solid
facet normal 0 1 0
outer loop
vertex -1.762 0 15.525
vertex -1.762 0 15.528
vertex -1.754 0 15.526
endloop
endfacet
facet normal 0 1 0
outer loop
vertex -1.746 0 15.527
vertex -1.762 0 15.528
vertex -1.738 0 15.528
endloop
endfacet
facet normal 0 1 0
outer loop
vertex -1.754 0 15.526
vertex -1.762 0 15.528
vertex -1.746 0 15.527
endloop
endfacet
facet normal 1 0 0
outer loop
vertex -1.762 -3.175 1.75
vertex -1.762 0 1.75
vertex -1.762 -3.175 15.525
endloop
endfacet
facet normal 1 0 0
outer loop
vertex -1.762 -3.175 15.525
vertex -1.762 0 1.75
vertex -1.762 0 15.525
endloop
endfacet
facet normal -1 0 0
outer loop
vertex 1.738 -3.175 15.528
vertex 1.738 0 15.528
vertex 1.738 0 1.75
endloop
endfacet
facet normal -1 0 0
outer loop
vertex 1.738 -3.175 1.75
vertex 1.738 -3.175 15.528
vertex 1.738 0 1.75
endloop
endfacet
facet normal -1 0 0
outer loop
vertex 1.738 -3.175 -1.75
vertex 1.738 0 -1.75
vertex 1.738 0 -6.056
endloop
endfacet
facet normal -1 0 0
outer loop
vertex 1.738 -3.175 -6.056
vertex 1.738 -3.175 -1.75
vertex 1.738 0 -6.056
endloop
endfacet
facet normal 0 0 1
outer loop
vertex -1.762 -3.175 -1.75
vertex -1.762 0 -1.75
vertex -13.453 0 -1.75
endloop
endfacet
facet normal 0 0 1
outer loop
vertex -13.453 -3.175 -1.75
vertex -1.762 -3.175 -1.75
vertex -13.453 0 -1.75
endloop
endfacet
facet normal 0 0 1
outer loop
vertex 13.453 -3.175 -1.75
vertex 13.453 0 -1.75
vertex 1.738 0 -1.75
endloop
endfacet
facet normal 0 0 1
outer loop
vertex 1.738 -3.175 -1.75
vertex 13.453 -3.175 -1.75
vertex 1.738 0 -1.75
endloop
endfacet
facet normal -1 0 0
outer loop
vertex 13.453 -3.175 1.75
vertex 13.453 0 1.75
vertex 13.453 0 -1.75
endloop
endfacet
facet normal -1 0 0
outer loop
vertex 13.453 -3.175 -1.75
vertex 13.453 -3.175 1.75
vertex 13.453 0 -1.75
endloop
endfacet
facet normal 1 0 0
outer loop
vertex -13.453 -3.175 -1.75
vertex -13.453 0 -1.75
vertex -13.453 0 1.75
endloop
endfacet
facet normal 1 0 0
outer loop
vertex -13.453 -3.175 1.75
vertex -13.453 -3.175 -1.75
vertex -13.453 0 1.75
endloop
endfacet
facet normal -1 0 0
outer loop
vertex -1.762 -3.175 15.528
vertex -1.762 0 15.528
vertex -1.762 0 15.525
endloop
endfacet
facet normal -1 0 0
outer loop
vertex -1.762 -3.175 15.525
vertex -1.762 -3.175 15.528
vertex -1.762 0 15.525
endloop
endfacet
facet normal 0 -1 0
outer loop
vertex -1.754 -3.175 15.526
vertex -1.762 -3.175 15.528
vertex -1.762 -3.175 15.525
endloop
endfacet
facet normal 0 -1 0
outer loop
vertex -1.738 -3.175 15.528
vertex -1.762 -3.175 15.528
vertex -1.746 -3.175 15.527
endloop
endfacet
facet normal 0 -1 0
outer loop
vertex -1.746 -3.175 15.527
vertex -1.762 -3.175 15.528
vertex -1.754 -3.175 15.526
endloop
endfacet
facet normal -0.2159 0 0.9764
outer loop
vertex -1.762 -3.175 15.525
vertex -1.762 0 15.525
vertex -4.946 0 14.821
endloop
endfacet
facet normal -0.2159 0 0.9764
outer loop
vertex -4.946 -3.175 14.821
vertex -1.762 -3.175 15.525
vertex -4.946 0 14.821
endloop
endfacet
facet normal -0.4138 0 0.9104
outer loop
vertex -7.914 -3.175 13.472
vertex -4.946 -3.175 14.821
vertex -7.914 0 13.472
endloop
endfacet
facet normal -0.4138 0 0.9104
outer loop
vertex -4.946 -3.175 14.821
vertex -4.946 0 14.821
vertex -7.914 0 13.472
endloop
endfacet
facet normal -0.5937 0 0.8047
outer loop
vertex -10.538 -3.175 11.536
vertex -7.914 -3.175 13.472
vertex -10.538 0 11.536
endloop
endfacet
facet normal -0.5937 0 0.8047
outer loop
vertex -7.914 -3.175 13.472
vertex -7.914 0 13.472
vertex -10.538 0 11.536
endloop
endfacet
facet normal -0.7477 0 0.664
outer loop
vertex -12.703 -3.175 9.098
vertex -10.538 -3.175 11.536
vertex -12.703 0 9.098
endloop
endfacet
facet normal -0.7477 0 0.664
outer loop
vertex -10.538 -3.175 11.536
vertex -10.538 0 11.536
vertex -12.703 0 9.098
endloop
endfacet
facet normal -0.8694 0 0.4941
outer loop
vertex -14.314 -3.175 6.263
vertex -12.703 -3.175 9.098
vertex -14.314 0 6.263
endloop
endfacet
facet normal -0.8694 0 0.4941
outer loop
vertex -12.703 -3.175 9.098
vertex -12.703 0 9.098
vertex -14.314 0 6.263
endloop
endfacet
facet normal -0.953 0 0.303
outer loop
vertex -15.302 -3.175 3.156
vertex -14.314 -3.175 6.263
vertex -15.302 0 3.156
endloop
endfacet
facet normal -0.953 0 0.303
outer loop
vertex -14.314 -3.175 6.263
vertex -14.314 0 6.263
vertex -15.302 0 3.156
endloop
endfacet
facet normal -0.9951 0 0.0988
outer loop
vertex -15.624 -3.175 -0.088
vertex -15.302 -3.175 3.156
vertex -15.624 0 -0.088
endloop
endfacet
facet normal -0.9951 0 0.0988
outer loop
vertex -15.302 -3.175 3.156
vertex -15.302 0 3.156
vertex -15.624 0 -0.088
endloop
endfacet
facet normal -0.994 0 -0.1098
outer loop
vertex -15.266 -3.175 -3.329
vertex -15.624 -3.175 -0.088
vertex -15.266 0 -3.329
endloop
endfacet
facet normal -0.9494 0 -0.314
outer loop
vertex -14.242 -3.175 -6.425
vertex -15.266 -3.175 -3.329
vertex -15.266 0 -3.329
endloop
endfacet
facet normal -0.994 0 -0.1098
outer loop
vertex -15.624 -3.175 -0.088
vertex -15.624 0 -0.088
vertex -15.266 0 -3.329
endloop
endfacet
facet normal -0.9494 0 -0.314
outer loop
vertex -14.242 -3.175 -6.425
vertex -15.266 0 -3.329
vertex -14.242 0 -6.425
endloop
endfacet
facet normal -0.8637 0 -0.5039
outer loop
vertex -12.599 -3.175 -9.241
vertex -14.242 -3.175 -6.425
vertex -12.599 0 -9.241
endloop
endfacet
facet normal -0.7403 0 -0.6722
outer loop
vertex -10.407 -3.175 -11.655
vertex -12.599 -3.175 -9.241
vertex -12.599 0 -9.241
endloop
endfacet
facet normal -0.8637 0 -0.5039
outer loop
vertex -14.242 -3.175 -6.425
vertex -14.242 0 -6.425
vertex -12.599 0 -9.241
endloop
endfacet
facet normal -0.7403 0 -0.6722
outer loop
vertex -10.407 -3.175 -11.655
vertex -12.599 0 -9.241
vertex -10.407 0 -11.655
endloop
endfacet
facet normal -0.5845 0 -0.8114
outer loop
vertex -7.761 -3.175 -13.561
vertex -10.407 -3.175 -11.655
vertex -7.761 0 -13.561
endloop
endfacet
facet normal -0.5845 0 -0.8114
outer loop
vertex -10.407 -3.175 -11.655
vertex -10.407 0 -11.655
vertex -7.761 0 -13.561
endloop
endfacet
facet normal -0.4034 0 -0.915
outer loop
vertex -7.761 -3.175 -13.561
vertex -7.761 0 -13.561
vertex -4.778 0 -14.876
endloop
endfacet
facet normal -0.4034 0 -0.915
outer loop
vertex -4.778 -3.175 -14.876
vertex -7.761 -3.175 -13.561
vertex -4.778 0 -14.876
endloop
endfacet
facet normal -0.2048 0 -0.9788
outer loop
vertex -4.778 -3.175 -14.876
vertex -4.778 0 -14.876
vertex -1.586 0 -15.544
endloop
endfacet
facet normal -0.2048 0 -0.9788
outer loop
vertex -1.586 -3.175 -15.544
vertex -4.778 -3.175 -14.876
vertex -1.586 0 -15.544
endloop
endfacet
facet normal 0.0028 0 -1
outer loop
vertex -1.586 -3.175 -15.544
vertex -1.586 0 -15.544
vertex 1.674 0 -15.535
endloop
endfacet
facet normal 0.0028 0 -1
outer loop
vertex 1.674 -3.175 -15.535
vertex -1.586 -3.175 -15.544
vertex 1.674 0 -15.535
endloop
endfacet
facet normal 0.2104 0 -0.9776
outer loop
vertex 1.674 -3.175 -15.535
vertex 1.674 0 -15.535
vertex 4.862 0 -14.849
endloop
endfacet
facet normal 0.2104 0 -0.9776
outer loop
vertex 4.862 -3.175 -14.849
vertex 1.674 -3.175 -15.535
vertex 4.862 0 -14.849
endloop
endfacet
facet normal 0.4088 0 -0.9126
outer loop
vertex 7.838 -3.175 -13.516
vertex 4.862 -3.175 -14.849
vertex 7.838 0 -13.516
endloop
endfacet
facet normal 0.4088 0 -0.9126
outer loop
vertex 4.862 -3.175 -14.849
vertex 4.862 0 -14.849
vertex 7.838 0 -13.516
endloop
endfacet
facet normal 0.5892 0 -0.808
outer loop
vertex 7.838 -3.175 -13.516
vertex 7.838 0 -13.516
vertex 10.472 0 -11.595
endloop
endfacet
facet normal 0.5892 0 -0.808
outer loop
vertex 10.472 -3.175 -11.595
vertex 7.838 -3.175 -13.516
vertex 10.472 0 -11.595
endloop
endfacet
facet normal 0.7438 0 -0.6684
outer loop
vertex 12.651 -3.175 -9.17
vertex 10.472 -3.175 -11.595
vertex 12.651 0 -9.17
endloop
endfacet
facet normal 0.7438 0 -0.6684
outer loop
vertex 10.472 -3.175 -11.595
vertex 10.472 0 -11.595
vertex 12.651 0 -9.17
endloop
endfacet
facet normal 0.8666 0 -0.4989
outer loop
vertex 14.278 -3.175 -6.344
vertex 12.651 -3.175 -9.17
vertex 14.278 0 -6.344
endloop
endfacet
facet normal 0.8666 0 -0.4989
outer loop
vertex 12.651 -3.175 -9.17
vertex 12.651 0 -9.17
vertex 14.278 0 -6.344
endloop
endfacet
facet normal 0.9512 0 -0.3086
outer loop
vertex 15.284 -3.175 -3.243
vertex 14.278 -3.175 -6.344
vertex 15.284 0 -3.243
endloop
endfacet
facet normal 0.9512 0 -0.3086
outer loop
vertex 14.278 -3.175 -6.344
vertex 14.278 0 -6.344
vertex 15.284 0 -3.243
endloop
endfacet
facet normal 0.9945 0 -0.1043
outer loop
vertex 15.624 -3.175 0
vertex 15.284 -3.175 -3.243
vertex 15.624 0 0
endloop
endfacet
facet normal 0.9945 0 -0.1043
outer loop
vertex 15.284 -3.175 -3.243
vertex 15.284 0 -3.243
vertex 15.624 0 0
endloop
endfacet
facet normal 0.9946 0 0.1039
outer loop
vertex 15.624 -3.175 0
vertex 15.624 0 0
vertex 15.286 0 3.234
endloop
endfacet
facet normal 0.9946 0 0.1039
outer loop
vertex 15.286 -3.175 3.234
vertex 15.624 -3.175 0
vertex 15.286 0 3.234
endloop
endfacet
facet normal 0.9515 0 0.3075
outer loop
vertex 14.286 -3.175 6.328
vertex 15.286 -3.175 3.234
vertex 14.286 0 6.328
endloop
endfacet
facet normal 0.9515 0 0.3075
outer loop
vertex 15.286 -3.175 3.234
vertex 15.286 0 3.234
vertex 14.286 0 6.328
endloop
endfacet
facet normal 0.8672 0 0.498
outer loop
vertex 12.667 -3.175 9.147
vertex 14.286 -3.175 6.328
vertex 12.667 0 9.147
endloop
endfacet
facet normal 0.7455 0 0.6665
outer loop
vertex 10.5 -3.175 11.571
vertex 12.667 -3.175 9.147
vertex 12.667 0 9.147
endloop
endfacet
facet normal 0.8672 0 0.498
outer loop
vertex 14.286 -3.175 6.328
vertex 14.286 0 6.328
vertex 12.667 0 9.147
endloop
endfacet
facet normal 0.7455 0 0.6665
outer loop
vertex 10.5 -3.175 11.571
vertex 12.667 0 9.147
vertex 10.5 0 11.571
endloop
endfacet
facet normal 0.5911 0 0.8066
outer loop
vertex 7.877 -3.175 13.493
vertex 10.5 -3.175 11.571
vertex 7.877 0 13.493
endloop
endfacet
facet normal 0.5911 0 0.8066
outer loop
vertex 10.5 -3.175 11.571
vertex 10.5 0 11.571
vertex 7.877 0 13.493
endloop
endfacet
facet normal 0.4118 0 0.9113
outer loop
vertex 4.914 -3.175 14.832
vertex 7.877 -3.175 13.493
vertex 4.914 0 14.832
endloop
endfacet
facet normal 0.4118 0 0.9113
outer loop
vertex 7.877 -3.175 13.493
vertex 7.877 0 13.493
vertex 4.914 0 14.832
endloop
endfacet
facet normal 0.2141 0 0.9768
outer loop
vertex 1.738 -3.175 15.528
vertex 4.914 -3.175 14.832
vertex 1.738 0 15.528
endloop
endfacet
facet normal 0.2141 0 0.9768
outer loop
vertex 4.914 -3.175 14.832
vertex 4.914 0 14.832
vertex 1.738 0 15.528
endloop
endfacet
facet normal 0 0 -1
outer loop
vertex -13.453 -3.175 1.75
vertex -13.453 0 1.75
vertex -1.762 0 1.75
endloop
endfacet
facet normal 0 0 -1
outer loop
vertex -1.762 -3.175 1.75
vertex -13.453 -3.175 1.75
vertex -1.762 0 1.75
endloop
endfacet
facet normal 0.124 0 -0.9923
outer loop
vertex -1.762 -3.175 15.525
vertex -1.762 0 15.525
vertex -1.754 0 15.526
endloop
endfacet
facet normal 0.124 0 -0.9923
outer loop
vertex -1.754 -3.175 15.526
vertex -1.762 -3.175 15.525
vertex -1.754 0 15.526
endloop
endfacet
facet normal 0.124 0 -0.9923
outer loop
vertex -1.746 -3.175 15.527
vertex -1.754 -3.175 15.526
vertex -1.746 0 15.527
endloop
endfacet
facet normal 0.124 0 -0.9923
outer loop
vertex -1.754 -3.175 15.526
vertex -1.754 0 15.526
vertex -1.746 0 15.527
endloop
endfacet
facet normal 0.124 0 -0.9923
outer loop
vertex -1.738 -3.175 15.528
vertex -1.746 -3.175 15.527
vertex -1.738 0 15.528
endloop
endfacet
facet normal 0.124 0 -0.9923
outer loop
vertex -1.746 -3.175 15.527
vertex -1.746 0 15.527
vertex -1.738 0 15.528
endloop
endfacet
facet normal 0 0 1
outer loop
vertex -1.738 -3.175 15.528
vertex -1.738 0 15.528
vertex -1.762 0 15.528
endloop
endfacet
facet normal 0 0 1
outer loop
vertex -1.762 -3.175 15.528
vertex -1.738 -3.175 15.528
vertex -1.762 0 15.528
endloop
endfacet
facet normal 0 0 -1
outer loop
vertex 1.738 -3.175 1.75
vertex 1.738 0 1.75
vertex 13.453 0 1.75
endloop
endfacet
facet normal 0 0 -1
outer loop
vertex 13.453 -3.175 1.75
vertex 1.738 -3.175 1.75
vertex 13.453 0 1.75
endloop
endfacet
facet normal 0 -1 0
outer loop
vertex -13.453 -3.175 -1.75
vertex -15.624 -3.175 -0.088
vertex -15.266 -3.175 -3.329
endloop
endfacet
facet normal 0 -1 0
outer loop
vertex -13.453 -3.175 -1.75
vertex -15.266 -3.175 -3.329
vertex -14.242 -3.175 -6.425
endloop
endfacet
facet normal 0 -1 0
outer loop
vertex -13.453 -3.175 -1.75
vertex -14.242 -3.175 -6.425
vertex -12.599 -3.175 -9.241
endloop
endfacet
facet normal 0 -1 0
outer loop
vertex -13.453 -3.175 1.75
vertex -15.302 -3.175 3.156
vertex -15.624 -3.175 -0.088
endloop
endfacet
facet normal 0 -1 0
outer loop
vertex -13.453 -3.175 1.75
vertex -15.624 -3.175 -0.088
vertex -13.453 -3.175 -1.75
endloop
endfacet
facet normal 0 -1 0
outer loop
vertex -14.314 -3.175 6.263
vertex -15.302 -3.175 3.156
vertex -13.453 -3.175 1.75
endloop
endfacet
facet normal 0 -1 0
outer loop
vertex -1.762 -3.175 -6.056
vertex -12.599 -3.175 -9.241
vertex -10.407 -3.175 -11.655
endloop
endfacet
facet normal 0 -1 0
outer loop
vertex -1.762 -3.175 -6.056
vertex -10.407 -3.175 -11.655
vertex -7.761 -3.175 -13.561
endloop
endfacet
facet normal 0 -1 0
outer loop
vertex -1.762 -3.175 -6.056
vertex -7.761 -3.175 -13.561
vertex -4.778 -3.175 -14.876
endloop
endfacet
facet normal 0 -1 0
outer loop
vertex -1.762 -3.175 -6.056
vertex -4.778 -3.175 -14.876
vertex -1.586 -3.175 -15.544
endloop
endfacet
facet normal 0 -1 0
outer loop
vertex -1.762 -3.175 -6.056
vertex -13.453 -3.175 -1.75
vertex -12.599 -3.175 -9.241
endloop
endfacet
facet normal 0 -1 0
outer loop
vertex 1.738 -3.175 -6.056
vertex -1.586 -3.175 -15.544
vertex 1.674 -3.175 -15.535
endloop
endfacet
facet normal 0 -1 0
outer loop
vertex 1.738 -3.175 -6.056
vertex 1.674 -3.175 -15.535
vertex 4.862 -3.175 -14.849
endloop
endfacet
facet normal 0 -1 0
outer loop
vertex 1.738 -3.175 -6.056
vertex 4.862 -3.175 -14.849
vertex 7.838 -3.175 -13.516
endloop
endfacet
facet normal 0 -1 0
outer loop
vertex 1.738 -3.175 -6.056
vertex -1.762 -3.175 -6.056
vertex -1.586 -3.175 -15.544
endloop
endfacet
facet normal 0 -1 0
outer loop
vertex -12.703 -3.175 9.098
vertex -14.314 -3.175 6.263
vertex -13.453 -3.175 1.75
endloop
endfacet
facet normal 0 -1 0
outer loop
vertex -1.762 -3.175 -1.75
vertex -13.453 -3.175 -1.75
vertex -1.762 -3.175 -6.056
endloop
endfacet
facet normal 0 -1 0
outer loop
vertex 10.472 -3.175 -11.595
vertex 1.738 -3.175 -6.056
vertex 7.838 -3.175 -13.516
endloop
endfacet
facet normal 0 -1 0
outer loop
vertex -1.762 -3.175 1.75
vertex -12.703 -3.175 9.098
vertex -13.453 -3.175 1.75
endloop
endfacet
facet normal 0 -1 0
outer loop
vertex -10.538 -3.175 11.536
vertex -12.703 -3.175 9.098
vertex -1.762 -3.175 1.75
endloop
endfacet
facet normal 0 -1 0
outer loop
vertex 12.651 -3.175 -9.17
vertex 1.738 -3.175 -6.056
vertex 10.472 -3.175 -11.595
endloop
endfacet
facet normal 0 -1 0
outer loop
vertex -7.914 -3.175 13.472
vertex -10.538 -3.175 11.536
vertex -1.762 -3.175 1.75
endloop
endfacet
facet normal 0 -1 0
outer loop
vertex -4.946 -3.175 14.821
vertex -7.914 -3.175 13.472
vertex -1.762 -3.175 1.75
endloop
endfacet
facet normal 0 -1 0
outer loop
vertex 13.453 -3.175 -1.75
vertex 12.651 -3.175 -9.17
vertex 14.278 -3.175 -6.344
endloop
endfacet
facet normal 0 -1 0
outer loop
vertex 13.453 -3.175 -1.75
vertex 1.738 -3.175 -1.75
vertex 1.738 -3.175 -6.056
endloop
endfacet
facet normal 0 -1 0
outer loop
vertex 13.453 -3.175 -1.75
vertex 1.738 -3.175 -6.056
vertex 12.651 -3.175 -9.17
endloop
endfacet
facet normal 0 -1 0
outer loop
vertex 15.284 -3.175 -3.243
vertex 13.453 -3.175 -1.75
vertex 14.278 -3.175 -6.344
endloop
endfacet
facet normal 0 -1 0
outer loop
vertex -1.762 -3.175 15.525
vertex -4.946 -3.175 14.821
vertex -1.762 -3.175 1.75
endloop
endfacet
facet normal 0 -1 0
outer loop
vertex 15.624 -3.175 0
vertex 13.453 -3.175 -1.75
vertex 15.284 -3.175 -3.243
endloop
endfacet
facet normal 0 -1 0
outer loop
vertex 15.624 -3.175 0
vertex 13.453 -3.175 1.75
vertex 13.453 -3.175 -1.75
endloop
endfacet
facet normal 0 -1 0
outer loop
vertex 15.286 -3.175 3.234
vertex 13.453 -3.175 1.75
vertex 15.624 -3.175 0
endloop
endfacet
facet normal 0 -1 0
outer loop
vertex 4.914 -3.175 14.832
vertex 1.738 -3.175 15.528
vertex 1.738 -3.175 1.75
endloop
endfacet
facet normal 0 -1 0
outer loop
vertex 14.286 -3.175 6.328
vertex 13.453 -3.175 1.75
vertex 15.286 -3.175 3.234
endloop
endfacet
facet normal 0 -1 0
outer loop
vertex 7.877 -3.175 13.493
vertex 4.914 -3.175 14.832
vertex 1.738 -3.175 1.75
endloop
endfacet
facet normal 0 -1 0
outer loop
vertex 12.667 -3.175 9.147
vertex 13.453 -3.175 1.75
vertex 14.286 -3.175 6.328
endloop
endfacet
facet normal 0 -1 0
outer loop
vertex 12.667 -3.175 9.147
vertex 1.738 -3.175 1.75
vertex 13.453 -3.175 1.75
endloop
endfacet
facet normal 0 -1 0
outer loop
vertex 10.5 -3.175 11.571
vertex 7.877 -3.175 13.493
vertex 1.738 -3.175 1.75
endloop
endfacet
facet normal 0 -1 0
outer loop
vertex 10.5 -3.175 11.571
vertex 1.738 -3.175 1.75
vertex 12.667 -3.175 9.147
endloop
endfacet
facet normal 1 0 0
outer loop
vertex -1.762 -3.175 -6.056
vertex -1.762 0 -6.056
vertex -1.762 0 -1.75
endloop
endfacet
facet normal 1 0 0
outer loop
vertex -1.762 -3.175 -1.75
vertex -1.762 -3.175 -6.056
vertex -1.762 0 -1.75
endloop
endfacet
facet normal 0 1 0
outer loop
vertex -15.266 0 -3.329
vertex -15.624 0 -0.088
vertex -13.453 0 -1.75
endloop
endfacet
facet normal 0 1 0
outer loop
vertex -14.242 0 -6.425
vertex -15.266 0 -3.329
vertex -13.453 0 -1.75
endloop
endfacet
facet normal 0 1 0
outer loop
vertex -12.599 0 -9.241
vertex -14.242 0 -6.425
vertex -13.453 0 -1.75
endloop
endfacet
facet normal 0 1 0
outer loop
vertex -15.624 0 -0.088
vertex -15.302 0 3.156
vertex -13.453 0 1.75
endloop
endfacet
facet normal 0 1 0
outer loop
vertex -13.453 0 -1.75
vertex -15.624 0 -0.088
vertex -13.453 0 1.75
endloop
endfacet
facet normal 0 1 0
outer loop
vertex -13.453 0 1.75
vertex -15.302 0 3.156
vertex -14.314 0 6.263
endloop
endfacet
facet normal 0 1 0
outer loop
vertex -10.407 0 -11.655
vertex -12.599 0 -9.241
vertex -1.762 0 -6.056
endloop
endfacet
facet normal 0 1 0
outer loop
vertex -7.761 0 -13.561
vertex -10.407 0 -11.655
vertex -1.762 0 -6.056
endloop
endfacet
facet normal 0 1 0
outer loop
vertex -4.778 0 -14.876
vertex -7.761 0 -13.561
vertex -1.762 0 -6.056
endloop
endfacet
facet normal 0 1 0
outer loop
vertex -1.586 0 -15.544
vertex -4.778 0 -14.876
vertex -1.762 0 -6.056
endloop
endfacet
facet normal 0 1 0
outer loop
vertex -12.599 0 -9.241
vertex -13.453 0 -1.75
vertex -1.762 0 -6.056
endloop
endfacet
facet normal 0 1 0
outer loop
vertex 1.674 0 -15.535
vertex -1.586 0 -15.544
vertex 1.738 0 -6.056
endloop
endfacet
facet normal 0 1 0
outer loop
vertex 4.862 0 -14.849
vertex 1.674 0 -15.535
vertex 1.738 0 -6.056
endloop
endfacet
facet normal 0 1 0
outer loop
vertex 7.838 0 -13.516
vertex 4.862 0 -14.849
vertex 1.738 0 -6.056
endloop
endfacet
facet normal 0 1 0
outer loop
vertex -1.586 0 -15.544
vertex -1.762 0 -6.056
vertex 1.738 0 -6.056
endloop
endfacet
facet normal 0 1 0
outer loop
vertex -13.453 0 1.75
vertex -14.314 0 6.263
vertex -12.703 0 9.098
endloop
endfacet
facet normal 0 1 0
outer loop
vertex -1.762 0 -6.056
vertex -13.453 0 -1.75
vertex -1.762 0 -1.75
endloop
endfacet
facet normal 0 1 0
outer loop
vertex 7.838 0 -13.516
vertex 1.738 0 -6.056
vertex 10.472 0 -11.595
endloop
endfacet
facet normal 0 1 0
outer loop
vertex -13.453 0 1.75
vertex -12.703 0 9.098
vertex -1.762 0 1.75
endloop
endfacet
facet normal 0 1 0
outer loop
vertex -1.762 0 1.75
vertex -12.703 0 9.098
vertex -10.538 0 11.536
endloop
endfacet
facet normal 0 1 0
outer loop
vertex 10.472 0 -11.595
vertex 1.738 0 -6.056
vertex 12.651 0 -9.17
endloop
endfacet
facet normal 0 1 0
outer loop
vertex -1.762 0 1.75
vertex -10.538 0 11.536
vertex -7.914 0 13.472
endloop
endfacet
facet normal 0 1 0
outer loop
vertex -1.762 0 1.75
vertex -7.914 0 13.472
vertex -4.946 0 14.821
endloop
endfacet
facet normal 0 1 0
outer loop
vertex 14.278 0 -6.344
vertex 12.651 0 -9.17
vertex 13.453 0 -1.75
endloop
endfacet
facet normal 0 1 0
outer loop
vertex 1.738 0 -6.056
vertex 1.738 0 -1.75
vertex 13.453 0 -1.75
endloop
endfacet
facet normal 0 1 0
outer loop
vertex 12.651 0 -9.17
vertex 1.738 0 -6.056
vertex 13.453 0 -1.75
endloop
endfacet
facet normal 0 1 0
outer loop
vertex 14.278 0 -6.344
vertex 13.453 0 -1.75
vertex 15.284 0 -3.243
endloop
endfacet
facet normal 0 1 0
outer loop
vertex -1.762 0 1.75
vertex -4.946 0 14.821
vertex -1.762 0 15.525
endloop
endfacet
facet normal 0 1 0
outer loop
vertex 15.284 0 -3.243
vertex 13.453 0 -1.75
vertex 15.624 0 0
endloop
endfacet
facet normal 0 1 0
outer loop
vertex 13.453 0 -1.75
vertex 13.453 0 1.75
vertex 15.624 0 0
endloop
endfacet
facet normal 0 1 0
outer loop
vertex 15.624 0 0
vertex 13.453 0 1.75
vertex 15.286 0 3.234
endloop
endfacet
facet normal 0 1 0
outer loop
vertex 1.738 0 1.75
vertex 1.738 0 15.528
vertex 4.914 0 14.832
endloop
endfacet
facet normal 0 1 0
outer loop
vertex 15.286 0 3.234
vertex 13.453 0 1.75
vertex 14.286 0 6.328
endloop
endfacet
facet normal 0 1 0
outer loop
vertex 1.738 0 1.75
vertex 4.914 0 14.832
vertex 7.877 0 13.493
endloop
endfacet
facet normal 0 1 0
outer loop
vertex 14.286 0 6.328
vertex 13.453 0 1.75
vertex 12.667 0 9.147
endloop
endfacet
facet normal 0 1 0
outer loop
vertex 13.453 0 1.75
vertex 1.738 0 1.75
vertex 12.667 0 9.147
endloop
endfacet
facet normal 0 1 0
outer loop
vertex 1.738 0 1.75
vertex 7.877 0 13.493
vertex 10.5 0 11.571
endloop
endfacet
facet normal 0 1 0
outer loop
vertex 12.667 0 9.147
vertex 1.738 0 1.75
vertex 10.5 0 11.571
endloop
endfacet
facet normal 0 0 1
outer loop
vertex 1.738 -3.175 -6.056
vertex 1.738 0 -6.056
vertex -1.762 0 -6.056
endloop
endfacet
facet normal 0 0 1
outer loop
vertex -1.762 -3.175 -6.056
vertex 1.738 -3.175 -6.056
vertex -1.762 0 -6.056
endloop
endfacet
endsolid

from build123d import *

# Parameters (mm, degrees)
F1_DEPTH = 3.175


# Not quite as in the source:
# - a length typed as a fraction of an inch, garbled in the dataset ("3 / 203.2 mm" for 3/8 in), is restored


with BuildPart() as f1:
    # F0 (on Front) → F1 (new body)
    with BuildSketch(Plane.XZ):
        with BuildLine():
            ThreePointArc((-1.7620097291, 15.5248292089), (-10.4065959669, -11.6545167481), (15.6245, 0))
            ThreePointArc((15.6245, 0), (11.64646361, 10.4156077898), (1.7379902709, 15.52753651))
            Line((1.7379902709, 15.52753651), (1.7379902709, 1.75))
            Line((1.7379902709, 1.75), (13.4525578469, 1.75))
            Line((13.4525578469, 1.75), (13.4525578469, -1.75))
            Line((13.4525578469, -1.75), (1.7379902709, -1.75))
            Line((1.7379902709, -1.75), (1.7379902709, -6.05633948))
            Line((1.7379902709, -6.05633948), (-1.7620097291, -6.05633948))
            Line((-1.7620097291, -6.05633948), (-1.7620097291, -1.75))
            Line((-1.7620097291, -1.75), (-13.4525578469, -1.75))
            Line((-13.4525578469, -1.75), (-13.4525578469, 1.75))
            Line((-13.4525578469, 1.75), (-1.7620097291, 1.75))
            Line((-1.7620097291, 1.75), (-1.7620097291, 15.5248292089))
        make_face()
    extrude(amount=F1_DEPTH)


with BuildPart() as f1b:
    # F0 (on Front) → F1, piece 2 (new body)
    with BuildSketch(Plane.XZ):
        with BuildLine():
            Line((-1.7620097291, 15.52753651), (-1.7620097291, 15.5248292089))
            ThreePointArc((-1.7620097291, 15.5248292089), (-1.7500005235, 15.5261875043), (-1.7379902709, 15.52753651))
            Line((-1.7379902709, 15.52753651), (-1.7620097291, 15.52753651))
        make_face()
    extrude(amount=F1_DEPTH)


solid = Compound([f1.part, f1b.part])
